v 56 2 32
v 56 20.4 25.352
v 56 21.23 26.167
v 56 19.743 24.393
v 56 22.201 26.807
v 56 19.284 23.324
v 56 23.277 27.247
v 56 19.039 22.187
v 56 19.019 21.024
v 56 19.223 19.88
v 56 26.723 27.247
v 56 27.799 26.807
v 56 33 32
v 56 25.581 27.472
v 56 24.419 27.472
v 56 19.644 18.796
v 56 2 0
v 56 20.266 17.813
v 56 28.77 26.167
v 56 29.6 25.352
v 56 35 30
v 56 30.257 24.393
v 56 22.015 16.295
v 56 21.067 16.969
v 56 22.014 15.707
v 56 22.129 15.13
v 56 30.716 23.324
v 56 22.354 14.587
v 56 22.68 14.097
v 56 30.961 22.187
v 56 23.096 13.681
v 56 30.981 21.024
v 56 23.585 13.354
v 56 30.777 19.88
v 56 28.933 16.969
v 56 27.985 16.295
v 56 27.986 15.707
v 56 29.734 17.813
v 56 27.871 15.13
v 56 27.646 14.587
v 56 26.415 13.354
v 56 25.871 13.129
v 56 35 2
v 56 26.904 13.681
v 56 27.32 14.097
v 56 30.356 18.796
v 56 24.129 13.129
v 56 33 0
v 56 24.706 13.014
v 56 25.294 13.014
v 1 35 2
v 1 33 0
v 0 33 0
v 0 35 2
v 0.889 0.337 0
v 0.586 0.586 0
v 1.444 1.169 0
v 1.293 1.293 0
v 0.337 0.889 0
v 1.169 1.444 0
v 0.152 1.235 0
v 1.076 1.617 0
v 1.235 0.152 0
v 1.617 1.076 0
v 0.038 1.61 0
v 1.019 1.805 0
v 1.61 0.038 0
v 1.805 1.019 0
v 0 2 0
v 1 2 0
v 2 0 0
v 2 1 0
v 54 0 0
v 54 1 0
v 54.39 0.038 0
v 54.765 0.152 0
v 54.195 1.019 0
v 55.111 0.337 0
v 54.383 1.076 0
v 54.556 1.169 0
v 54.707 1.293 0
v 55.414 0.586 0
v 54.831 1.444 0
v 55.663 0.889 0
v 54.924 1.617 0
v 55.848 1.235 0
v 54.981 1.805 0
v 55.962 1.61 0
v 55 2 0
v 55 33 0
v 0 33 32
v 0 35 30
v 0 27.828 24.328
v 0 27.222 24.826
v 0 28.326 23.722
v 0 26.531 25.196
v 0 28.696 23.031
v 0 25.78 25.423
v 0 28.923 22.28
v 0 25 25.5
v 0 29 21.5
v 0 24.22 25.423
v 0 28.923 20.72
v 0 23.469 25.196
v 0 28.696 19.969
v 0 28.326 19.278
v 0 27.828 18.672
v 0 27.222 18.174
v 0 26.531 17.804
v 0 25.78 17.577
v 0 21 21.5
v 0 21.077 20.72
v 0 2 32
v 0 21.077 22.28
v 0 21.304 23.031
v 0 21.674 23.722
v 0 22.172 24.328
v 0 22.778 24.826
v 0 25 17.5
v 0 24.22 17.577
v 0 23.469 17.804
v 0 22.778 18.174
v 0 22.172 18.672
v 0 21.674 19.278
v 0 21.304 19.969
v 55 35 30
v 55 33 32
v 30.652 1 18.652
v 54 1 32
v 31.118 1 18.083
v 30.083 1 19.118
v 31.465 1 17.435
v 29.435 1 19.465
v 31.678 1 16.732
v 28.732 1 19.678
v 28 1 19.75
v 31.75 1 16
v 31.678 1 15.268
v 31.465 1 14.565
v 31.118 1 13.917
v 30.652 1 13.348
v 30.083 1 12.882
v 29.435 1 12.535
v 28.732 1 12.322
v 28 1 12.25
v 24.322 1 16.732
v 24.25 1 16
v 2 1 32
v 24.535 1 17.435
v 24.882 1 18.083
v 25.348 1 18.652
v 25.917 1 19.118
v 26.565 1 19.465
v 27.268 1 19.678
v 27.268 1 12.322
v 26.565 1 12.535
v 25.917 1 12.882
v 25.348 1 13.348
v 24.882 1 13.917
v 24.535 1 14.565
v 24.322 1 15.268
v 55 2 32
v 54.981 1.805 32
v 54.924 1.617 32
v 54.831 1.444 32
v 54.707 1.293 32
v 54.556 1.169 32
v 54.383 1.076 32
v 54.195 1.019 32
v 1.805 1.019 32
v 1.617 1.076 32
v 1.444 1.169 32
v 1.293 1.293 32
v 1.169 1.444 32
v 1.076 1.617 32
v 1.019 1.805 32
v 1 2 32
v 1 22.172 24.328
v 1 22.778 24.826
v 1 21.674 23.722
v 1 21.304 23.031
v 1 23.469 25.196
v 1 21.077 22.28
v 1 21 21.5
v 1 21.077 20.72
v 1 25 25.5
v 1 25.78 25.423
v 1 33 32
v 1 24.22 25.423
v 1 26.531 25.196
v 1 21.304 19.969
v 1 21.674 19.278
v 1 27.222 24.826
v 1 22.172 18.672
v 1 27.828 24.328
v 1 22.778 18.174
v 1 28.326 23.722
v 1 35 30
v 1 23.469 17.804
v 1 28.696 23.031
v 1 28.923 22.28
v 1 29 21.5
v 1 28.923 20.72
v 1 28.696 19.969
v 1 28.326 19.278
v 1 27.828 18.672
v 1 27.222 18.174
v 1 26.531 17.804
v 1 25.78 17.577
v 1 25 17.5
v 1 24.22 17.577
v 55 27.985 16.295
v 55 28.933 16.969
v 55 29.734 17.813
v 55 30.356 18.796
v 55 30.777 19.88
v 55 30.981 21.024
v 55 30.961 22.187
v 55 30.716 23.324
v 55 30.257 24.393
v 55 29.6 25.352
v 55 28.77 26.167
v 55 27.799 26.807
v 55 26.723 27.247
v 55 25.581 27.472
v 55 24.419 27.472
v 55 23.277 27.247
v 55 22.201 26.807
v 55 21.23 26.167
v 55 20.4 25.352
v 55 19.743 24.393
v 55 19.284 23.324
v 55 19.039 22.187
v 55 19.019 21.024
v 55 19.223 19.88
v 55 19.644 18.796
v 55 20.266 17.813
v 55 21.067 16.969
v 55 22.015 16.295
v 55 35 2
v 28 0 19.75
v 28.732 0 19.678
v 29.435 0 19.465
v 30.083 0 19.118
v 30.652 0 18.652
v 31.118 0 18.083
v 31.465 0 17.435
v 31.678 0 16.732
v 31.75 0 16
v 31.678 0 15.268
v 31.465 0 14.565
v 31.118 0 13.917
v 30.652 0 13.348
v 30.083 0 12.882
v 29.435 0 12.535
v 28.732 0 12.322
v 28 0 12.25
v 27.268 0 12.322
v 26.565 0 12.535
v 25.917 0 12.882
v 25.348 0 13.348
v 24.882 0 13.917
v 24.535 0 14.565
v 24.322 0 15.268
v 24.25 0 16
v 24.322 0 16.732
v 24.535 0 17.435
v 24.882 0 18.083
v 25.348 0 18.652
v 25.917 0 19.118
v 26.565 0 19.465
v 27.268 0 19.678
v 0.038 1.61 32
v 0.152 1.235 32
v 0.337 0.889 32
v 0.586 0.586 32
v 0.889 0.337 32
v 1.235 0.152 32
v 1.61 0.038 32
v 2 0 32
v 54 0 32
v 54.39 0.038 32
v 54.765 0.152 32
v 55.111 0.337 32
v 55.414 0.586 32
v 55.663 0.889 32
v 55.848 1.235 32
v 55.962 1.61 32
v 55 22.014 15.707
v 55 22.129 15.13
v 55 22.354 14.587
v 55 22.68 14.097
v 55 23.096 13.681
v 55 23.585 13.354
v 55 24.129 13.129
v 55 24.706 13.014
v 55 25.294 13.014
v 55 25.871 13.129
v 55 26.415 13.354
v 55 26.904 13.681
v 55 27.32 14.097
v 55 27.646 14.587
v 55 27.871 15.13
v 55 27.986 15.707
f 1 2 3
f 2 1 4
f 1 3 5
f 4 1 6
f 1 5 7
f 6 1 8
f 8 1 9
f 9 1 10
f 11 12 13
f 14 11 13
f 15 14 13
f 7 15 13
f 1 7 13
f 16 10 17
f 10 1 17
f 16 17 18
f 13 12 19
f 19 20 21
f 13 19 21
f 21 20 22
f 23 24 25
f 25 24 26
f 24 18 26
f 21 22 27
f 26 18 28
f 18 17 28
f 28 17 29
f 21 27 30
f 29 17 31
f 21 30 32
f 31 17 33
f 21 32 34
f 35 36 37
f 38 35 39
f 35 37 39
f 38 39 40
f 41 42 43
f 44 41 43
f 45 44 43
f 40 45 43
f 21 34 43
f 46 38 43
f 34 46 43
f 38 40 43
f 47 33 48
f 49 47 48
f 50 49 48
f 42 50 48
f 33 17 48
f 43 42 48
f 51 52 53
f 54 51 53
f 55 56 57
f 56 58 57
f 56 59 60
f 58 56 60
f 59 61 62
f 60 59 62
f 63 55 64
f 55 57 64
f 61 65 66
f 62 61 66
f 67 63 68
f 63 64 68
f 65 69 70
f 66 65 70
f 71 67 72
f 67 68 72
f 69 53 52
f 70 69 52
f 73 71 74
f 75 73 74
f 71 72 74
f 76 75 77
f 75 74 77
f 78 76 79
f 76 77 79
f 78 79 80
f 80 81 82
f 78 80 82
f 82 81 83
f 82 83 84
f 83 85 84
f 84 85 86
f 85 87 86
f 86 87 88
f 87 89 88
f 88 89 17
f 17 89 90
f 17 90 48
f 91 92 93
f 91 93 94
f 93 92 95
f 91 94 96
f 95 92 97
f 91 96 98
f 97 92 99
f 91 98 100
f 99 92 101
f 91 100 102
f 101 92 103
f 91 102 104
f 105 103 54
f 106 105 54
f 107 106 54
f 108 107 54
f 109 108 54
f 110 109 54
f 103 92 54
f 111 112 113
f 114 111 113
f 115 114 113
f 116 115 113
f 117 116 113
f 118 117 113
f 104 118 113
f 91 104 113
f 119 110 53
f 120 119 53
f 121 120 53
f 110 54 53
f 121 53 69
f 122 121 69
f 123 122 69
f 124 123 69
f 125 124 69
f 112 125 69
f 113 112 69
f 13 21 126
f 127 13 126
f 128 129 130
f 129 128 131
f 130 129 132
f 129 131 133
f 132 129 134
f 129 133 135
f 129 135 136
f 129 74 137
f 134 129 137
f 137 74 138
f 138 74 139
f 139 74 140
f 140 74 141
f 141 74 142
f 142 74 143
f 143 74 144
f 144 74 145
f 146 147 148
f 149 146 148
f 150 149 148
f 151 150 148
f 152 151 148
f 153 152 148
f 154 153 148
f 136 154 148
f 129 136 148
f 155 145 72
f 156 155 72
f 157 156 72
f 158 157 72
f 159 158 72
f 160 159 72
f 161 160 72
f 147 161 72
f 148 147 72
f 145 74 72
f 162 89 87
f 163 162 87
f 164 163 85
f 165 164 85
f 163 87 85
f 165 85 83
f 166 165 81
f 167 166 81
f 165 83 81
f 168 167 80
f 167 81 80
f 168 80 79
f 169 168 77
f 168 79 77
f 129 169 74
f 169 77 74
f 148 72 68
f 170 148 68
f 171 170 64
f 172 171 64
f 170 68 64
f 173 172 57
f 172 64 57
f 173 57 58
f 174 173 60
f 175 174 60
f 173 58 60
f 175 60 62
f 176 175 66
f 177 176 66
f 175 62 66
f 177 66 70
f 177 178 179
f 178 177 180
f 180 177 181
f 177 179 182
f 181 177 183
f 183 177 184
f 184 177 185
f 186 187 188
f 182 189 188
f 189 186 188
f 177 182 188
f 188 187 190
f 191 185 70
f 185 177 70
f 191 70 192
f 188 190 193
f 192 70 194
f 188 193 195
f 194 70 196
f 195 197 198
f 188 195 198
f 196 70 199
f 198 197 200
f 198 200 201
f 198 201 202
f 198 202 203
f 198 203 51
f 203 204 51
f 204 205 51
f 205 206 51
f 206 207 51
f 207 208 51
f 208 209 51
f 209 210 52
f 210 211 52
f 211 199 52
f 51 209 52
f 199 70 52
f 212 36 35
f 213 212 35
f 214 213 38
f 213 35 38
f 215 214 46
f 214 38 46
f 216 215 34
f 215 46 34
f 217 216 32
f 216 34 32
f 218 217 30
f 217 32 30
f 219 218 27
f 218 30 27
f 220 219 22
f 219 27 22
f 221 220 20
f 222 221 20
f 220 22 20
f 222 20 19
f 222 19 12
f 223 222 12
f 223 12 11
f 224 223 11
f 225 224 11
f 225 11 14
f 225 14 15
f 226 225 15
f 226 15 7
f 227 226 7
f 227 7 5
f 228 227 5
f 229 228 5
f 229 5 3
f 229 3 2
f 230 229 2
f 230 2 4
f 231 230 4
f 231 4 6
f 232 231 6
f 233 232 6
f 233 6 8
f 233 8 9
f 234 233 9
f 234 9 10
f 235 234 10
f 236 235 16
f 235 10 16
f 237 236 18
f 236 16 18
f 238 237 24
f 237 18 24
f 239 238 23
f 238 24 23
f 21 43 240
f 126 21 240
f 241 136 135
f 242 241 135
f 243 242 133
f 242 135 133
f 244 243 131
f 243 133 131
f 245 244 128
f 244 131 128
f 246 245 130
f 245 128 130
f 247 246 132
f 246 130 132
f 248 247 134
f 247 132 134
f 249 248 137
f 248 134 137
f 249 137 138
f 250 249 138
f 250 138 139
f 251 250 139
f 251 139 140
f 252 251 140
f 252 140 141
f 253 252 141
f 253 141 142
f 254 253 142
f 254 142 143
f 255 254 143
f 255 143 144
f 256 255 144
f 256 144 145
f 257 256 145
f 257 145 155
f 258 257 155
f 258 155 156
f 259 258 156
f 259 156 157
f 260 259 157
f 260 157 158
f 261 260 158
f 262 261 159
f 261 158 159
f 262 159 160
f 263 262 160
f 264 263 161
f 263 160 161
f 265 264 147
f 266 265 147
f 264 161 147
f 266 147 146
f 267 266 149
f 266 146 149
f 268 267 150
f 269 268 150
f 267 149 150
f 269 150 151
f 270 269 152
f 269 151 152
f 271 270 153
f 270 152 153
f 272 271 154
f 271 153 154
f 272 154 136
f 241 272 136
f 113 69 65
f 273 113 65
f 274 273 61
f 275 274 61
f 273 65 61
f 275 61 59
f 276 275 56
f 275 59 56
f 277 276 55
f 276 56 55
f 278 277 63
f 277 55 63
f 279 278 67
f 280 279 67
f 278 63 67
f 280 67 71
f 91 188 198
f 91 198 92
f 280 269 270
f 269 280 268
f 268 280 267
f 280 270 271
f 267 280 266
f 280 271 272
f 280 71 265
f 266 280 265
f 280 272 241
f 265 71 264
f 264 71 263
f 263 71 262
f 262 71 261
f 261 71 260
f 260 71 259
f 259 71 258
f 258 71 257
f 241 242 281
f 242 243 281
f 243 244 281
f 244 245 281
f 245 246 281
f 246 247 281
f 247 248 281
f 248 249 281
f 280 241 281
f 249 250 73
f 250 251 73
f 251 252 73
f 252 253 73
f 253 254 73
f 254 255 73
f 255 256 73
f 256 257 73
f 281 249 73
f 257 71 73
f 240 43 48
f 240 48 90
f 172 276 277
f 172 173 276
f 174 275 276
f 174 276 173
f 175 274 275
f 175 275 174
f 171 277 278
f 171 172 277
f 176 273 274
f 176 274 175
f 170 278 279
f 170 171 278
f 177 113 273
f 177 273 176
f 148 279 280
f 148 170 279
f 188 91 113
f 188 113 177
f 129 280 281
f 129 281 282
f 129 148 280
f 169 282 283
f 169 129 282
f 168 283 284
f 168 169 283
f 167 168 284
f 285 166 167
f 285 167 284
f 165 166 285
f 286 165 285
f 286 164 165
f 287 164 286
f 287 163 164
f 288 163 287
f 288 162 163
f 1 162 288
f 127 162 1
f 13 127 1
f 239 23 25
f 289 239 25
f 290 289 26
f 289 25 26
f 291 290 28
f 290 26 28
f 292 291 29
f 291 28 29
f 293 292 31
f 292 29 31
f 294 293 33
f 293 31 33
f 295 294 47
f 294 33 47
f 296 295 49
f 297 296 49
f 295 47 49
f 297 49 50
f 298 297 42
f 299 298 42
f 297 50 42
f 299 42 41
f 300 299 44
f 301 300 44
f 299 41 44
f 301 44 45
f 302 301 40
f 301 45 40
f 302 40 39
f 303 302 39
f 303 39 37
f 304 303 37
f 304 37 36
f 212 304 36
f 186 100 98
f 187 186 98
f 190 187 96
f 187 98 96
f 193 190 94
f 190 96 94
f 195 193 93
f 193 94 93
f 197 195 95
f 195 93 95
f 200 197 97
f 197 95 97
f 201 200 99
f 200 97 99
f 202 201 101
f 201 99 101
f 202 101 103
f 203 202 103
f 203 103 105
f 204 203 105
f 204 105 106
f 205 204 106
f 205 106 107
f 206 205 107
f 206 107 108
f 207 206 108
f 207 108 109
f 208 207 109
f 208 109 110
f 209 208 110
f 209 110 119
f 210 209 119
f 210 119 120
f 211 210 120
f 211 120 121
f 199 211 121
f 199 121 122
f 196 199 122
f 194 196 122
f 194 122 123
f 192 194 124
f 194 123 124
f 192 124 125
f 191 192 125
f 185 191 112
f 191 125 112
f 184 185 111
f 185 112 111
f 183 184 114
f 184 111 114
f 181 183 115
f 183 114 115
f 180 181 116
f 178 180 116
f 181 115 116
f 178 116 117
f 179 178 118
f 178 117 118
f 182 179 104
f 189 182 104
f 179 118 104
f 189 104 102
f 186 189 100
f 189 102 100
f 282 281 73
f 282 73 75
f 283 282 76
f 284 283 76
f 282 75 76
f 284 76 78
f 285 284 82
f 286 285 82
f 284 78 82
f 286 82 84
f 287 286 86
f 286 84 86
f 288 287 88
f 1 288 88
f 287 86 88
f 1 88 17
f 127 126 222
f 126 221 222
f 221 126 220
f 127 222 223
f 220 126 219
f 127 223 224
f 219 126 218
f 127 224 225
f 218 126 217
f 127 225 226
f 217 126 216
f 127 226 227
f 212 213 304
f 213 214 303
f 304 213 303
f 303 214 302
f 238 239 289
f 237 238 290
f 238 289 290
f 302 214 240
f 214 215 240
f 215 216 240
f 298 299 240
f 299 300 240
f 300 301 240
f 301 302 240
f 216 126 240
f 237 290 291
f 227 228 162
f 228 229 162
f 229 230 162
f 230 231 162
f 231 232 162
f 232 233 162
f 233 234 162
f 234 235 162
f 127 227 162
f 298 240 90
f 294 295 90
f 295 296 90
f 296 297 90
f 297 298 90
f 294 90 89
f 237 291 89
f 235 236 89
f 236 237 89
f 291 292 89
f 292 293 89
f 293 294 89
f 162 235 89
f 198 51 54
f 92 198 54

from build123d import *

# Parameters (mm, degrees)
BASE_FLANGE1_DEPTH = 32
CUT_EXTRUDE1_DEPTH = 10
SKETCH9_R          = 4
CUT_EXTRUDE2_DEPTH = 10
SKETCH10_R         = 3.75
CUT_EXTRUDE3_DEPTH = 10
CHAMFER2_SIZE      = 2


# Sheet-metal steps are written as plain solids
with BuildPart() as part:
    # Sketch1 → Base-Flange1 (new body)
    with BuildSketch(Plane.XY):
        with BuildLine():
            Line((0, 35), (0, 2))
            ThreePointArc((0, 2), (0.585786438, 0.585786438), (2, 0))
            Line((2, 0), (54, 0))
            ThreePointArc((54, 0), (55.414213562, 0.585786438), (56, 2))
            Line((56, 2), (56, 35))
            Line((56, 35), (55, 35))
            Line((55, 35), (55, 2))
            ThreePointArc((55, 2), (54.707106781, 1.292893219), (54, 1))
            Line((54, 1), (2, 1))
            ThreePointArc((2, 1), (1.292893219, 1.292893219), (1, 2))
            Line((1, 2), (1, 35))
            Line((1, 35), (0, 35))
        make_face()
    extrude(amount=BASE_FLANGE1_DEPTH)

    # Sketch8 → Cut-Extrude1 (cut)
    with BuildSketch(Plane(origin=(56, 0, 0), x_dir=(0, 0, -1), z_dir=(1, 0, 0))):
        with BuildLine():
            ThreePointArc((-16.295454545, 27.985415651), (-27.5, 25), (-16.295454545, 22.014584349))
            ThreePointArc((-16.295454545, 22.014584349), (-13, 25), (-16.295454545, 27.985415651))
        make_face()
    extrude(amount=-CUT_EXTRUDE1_DEPTH, mode=Mode.SUBTRACT)

    # Sketch9 → Cut-Extrude2 (cut)
    with BuildSketch(Plane.ZY):
        with Locations((21.5, 25)):
            Circle(SKETCH9_R)
    extrude(amount=-CUT_EXTRUDE2_DEPTH, mode=Mode.SUBTRACT)

    # Sketch10 → Cut-Extrude3 (cut)
    with BuildSketch(Plane(origin=(0, 1, 0), x_dir=(1, 0, 0), z_dir=(0, 1, 0))):
        with Locations(Location((28, -16, 0), (0, 0, 270))):
            Circle(SKETCH10_R)
    extrude(amount=-CUT_EXTRUDE3_DEPTH, mode=Mode.SUBTRACT)

    # Chamfer2
    chamfer2_edges = [part.edges().sort_by_distance(p)[0] for p in [
        (0.5, 35, 0),
        (55.5, 35, 0),
        (0.5, 35, 32),
        (55.5, 35, 32),
    ]]
    chamfer(chamfer2_edges, length=CHAMFER2_SIZE)


solid = part.part
